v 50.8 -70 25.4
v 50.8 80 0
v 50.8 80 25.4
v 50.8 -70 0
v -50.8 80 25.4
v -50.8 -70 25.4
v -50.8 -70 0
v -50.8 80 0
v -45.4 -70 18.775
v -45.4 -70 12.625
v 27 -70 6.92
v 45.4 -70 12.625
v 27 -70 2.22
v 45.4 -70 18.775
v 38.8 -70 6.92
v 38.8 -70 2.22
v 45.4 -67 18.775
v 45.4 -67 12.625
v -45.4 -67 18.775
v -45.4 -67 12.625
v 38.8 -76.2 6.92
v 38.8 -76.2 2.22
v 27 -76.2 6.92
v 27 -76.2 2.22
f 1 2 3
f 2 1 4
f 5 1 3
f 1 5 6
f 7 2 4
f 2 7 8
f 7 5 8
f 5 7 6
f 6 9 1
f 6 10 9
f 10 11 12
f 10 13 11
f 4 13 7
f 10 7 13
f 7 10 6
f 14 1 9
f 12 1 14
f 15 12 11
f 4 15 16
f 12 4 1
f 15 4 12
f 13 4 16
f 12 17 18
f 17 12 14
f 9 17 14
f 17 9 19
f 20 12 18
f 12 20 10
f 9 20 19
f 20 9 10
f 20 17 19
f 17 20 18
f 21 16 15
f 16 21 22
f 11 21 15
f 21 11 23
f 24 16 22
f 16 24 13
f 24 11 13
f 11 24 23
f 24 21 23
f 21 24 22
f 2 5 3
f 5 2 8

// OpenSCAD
/**
 * FloppyDrive
 * @name FloppyDrive
 * @description FloppyDrive
 * @type asset
 * @parent
 */
module FloppyDrive() {

    x_throws_gap = 94;
    y_throws_gap = 70;

    x_size = 101.6;
    y_size = 150;
    z_size = 25.4;

    y_throw_facade_offset = 35;

    translate([
        0,
        y_size / 2 - y_throw_facade_offset - y_throws_gap / 2,
        z_size / 2
    ]) {

        facade_y_size = 4;
        translate([0, facade_y_size / 2, 0])
            cube([x_size, y_size - facade_y_size, z_size], center = true);

        translate([0, -y_size / 2 + facade_y_size / 2, 0]) {
            color("DarkSlateGray") {
                difference() {
                    cube([x_size, facade_y_size, z_size], center = true);

                    translate([0, -1, 3])
                    cube(
                        [
                            x_size - 5.4 * 2,
                            facade_y_size,
                            6.15
                        ],
                        center = true
                    );
                }

                button_x_size = 11.8;
                button_y_size = 6.2;
                button_z_size = 4.7;

                button_right_x_offest = 12;
                button_bottom_z_offest = 2.22;
                
                translate([
                    x_size / 2 - button_right_x_offest - button_x_size / 2,
                    -facade_y_size / 2 - button_y_size / 2,
                    -z_size / 2 + button_z_size / 2 + button_bottom_z_offest
                ])
                    cube([button_x_size, button_y_size, button_z_size], center = true);
            }
        }
    }
}


FloppyDrive();
